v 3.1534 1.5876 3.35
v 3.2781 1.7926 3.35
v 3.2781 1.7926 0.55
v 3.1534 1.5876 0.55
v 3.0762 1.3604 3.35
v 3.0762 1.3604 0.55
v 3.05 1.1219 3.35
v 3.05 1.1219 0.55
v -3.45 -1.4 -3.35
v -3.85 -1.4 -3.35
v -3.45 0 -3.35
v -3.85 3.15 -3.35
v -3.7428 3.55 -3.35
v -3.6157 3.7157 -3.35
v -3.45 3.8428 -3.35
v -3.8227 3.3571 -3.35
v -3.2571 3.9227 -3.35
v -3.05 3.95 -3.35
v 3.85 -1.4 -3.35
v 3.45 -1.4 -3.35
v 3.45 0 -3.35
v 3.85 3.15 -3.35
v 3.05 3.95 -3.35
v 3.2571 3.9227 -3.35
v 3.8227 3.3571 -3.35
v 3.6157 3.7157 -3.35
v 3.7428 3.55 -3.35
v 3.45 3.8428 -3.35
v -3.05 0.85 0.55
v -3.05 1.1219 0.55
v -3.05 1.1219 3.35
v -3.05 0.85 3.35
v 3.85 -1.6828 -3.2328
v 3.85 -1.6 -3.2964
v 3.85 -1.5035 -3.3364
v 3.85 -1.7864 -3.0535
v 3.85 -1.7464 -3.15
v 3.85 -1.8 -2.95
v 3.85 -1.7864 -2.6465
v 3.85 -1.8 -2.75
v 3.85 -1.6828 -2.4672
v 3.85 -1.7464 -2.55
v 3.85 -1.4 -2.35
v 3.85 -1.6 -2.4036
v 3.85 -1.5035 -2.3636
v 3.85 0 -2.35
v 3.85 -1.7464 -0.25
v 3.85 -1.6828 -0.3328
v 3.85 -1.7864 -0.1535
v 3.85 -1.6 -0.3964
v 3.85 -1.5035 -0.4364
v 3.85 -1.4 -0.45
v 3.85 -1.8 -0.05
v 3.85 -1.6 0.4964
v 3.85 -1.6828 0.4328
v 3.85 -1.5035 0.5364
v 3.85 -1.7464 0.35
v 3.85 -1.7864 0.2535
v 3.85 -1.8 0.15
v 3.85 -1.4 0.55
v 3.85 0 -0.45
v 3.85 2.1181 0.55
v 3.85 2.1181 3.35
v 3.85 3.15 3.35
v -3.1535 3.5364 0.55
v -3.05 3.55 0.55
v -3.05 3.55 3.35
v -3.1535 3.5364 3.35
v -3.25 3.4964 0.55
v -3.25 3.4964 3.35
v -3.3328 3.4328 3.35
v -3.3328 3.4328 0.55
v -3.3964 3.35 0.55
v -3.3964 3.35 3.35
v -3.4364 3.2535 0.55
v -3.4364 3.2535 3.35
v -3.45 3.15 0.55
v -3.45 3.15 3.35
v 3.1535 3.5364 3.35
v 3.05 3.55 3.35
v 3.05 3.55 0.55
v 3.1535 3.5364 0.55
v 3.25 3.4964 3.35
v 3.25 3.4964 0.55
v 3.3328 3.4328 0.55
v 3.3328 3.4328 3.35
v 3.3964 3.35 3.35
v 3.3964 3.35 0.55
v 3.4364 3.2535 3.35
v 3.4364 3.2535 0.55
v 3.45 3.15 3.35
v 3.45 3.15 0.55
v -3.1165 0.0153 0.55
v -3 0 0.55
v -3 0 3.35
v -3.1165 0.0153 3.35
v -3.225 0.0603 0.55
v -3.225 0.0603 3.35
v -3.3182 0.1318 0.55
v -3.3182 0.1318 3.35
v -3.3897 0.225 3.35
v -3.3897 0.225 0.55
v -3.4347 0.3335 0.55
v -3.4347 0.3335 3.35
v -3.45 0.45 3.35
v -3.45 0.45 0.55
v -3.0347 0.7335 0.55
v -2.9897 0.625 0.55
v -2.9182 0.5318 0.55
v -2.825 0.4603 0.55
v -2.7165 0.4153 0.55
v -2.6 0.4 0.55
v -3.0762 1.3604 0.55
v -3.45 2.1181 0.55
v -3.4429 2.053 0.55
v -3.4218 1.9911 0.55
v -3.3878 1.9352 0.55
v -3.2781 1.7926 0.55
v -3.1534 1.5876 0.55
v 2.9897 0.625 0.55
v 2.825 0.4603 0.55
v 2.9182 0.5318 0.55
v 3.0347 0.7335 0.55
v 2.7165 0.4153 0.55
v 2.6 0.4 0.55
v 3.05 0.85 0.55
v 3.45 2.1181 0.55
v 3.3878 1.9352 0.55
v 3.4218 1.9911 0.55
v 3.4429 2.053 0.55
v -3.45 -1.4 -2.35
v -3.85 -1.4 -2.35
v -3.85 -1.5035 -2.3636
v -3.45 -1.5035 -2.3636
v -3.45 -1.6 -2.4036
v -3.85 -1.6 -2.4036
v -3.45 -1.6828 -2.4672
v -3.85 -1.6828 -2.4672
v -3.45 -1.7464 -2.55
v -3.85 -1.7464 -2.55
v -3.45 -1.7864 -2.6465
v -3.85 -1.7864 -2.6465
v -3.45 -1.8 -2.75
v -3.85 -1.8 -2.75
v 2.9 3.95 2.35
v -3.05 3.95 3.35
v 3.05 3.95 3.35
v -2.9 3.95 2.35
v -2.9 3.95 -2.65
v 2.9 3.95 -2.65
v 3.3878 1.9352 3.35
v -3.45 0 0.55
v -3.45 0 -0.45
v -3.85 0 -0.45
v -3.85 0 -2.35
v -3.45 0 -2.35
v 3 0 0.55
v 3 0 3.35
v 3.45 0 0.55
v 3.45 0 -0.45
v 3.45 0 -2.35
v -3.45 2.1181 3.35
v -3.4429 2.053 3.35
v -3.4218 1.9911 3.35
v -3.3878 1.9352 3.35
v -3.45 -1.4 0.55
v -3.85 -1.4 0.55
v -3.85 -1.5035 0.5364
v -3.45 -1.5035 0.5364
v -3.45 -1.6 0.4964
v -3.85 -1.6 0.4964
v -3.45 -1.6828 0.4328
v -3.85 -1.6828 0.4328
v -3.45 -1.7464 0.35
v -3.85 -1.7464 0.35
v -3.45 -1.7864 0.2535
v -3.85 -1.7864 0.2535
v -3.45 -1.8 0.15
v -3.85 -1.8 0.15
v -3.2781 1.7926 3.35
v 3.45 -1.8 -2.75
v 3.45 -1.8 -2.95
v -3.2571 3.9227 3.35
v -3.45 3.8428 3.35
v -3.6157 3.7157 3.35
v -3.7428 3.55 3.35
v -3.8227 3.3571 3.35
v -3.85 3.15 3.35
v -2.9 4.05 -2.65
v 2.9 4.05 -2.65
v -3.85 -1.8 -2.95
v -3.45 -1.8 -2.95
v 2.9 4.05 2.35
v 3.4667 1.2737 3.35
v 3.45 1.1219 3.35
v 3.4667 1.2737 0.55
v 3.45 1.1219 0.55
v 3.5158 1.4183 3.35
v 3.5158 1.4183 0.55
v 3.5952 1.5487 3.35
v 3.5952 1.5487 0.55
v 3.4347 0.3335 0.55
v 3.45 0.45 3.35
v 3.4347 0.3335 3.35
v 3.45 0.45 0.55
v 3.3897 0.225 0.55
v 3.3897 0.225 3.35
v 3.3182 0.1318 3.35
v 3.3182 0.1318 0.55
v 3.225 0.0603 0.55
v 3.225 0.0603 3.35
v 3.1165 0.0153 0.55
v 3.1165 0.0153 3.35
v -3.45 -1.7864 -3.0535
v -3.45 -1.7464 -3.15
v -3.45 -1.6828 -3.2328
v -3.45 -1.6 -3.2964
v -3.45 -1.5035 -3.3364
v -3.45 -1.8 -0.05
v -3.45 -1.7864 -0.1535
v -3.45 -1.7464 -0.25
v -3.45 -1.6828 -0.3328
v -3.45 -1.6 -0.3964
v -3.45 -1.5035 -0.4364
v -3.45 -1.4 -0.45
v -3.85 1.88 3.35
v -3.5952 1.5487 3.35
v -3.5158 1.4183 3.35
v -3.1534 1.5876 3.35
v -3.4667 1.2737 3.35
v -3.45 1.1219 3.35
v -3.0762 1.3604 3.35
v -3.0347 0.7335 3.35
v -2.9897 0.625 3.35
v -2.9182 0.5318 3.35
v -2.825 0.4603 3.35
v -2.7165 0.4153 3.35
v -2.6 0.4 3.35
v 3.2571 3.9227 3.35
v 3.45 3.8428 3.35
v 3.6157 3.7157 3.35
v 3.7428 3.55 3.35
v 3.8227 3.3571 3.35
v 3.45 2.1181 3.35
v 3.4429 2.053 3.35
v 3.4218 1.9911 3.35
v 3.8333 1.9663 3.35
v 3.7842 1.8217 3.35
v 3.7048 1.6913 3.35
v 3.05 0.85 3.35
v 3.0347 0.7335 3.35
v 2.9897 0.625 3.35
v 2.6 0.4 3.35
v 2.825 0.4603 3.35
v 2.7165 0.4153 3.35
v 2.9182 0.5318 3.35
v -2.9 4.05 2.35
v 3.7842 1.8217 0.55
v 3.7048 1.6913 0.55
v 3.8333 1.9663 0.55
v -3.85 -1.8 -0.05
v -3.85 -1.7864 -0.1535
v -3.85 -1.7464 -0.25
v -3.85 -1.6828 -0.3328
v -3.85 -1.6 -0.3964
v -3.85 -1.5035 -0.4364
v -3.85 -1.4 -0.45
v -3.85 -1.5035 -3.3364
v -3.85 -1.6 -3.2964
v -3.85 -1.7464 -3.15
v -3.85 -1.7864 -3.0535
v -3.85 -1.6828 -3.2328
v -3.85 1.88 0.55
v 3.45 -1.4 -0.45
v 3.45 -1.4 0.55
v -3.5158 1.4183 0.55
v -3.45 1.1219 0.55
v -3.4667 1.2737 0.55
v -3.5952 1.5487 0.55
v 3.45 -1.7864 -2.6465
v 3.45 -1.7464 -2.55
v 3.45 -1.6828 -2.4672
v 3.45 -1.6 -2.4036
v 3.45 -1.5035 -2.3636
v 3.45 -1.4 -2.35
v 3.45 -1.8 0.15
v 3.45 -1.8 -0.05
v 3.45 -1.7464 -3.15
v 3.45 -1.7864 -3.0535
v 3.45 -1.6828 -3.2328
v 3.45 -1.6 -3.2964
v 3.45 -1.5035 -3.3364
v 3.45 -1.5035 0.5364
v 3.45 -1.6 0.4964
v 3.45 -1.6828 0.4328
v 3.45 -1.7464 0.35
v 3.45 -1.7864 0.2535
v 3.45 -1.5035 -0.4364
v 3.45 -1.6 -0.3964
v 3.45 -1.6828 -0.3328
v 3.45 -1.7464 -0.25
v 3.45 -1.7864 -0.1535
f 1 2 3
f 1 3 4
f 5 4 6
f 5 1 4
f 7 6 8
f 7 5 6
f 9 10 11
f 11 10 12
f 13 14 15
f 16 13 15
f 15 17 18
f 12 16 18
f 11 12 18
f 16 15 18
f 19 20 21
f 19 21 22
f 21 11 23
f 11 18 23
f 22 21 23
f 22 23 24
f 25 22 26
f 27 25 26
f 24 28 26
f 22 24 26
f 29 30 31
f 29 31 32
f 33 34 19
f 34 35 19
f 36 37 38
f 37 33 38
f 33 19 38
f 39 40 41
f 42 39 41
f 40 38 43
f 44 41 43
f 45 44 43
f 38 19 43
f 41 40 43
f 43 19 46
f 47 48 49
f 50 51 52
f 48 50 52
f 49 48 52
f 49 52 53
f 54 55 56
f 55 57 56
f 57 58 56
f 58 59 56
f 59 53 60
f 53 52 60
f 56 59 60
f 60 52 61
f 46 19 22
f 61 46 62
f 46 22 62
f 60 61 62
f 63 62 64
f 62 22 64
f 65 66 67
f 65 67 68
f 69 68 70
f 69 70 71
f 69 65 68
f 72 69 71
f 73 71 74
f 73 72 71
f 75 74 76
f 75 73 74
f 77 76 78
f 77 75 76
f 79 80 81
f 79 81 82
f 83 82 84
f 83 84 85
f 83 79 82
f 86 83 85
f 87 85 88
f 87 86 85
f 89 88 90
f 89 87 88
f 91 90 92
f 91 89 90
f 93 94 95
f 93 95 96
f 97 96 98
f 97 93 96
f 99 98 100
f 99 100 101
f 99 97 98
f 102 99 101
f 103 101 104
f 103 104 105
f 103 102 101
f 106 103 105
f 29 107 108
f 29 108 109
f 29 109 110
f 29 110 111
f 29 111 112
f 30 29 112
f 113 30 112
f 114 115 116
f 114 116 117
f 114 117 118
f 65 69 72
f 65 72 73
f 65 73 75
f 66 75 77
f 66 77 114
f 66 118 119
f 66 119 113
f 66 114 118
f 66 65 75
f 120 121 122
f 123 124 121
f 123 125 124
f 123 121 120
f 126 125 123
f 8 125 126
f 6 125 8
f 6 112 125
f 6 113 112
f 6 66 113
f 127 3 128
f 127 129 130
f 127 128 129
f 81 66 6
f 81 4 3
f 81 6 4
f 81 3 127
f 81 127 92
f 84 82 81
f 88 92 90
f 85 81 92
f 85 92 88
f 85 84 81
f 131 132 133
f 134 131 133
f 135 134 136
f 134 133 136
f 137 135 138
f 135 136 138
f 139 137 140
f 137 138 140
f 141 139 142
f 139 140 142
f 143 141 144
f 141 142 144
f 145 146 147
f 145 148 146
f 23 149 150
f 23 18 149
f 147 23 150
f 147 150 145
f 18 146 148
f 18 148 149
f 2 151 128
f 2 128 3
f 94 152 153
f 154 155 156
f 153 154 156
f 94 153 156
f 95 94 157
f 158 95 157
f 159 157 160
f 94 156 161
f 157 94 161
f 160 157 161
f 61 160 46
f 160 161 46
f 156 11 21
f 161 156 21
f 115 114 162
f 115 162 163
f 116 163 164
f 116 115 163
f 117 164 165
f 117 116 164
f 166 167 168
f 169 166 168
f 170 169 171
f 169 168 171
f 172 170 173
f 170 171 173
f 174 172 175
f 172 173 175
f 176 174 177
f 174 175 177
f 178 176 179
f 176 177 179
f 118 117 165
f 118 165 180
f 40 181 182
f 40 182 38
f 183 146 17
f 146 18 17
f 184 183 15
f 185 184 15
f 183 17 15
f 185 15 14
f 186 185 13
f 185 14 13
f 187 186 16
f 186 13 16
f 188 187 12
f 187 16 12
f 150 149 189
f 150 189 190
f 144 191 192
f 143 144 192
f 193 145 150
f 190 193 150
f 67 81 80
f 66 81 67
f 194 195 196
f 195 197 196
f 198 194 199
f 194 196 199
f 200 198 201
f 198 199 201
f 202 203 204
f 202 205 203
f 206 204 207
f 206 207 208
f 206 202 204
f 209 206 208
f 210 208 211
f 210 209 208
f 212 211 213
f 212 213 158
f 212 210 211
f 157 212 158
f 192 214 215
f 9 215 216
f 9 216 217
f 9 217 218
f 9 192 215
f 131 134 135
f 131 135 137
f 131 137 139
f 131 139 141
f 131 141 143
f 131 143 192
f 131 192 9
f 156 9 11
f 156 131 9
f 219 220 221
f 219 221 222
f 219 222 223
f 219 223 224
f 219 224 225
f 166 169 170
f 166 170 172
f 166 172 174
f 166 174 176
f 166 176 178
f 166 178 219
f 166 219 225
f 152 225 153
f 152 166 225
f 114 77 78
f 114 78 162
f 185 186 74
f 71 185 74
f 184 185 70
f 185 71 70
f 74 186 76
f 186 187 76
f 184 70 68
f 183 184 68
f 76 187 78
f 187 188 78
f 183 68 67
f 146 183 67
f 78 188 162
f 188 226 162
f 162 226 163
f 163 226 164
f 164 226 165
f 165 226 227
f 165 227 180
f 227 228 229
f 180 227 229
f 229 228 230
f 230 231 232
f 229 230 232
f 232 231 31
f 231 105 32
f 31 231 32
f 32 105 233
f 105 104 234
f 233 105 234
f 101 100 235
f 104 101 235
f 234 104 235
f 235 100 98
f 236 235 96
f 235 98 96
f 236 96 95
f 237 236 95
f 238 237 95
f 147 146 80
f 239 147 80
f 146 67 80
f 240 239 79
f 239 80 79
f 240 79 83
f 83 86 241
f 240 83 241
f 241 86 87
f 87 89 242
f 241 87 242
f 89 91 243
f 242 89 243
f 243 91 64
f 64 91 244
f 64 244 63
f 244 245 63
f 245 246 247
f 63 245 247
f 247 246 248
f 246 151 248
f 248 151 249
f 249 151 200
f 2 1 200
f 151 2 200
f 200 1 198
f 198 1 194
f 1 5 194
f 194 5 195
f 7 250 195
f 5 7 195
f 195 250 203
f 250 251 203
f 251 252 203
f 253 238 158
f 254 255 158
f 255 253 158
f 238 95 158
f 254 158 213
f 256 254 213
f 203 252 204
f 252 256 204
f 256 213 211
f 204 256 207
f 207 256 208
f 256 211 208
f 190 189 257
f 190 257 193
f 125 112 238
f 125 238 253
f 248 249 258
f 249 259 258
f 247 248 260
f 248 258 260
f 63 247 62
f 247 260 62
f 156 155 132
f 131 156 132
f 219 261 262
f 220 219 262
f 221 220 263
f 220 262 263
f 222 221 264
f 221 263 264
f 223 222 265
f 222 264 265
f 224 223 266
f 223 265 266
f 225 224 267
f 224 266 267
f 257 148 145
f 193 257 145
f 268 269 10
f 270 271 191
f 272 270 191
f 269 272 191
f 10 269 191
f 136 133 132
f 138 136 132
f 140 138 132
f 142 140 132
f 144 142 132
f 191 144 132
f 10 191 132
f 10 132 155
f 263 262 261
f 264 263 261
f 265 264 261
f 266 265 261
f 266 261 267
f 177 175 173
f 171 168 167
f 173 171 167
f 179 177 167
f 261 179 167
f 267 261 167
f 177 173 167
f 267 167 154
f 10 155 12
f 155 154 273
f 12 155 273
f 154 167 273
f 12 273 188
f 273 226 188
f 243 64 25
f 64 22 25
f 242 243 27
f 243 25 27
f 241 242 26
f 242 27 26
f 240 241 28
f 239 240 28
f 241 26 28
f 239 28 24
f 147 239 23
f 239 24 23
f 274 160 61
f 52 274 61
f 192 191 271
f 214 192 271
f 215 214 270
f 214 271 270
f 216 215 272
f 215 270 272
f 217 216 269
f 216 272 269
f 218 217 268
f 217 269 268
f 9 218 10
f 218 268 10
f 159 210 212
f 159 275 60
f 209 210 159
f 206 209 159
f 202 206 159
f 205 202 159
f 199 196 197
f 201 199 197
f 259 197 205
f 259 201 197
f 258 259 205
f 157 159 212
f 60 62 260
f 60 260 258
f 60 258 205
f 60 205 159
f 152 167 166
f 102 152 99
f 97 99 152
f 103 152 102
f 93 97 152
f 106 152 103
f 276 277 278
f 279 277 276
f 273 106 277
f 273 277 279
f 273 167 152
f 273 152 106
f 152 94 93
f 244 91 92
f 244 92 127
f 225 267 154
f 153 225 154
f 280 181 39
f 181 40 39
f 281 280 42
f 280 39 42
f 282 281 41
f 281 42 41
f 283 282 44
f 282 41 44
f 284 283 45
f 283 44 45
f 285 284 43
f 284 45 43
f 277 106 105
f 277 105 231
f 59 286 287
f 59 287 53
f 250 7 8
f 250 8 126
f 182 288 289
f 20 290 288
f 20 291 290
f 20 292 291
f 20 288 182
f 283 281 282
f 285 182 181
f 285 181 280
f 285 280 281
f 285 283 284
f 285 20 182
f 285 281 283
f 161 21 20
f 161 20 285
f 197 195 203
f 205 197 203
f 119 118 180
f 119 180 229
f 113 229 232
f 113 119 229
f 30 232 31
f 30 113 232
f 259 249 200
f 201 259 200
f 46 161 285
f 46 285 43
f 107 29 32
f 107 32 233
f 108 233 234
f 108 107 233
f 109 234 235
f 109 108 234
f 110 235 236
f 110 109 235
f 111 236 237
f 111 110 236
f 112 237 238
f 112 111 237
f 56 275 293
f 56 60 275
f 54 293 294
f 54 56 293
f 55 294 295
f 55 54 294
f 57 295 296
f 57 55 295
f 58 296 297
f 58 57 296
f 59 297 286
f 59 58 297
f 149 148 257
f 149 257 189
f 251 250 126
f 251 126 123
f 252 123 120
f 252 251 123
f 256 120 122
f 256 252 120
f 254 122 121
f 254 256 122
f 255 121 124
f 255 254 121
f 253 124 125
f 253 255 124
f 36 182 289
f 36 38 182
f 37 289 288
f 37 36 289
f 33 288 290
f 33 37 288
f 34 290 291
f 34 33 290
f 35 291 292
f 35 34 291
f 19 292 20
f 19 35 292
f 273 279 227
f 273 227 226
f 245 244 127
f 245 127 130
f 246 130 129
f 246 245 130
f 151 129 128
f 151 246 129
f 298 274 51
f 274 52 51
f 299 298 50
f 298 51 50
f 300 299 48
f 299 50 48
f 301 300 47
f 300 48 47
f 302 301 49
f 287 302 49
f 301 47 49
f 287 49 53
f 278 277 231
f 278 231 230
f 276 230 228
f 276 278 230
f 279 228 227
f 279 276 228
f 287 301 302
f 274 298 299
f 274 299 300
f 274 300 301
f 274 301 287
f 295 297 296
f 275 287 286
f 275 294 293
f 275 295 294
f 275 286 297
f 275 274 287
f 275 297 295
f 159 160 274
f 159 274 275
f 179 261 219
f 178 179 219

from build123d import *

# Parameters (mm, degrees)
SKETCH1_W              = 7.7
SKETCH1_H              = 6.7
BOSS_EXTRUDE1_DEPTH    = 3.95
SKETCH2_W              = 0.4
SKETCH2_H              = 1
BOSS_EXTRUDE2_DEPTH    = 1.8
FILLET1_R              = 0.4
LPATTERN1_COUNT        = 2
LPATTERN1_PITCH        = 2.9
FILLET1_OF_LPATTERN1_R = 0.4
FILLET2_R              = 0.8
CUT_EXTRUDE1_DEPTH     = 2.8
FILLET3_R              = 0.45
FILLET4_R              = 0.7
CUT_EXTRUDE2_DEPTH     = 2.8
MIRROR3_START          = 0.55
MIRROR3_DEPTH          = 2.8
MIRROR3_START_2        = -2.95
MIRROR3_2_OUTLINE_W    = 0.4
MIRROR3_2_OUTLINE_H    = 1.8
MIRROR3_2_DEPTH        = 0.2
MIRROR3_START_3        = -0.05
MIRROR3_3_OUTLINE_W    = 0.4
MIRROR3_3_OUTLINE_H    = 1.8
MIRROR3_3_DEPTH        = 0.2
MIRROR3_START_4        = -3.85
MIRROR3_4_DEPTH        = 0.4
SKETCH5_W              = 5.8
SKETCH5_H              = 5
BOSS_EXTRUDE3_DEPTH    = 0.1


with BuildPart() as part:
    # Sketch1 → Boss-Extrude1 (new body)
    with BuildSketch(Plane(origin=(0, 0, 0), x_dir=(1, 0, 0), z_dir=(0, 1, 0))):
        Rectangle(SKETCH1_W, SKETCH1_H)
    extrude(amount=BOSS_EXTRUDE1_DEPTH)

    # Sketch2 → Boss-Extrude2 (add)
    with BuildSketch(Plane.XZ):
        with Locations((3.65, -2.85)):
            Rectangle(SKETCH2_W, SKETCH2_H)
    boss_extrude2 = extrude(amount=BOSS_EXTRUDE2_DEPTH)

    # Fillet1
    fillet1_edges = [part.edges().sort_by_distance(p)[0] for p in [
        (3.65, -1.8, -2.35),
        (3.65, -1.8, -3.35),
    ]]
    fillet(fillet1_edges, radius=FILLET1_R)

    # LPattern1: Boss-Extrude2 ×2
    with Locations(*[(0, 0, i * LPATTERN1_PITCH) for i in range(1, LPATTERN1_COUNT)]):
        add(boss_extrude2)

    # Fillet1 of LPattern1
    fillet1_of_lpattern1_edges = [part.edges().sort_by_distance(p)[0] for p in [
        (3.65, -1.8, 0.55),
        (3.65, -1.8, -0.45),
    ]]
    fillet(fillet1_of_lpattern1_edges, radius=FILLET1_OF_LPATTERN1_R)

    # Fillet2
    fillet2_edges = [part.edges().sort_by_distance(p)[0] for p in [
        (3.85, 3.95, 0),
        (-3.85, 3.95, 0),
    ]]
    fillet(fillet2_edges, radius=FILLET2_R)

    # Sketch3 → Cut-Extrude1 (cut)
    with BuildSketch(Plane.XY.offset(3.35)):
        Polygon((3.85, 1.36), (3.85, 1.88), (3.45, 1.36), (3.45, 0), (3.85, 0), align=None)
    extrude(amount=-CUT_EXTRUDE1_DEPTH, mode=Mode.SUBTRACT)

    # Fillet3
    fillet3_edges = [part.edges().sort_by_distance(p)[0] for p in [
        (3.45, 0, 1.95),
    ]]
    fillet(fillet3_edges, radius=FILLET3_R)

    # Fillet4
    fillet4_edges = [part.edges().sort_by_distance(p)[0] for p in [
        (3.45, 1.36, 1.95),
        (3.85, 1.88, 1.95),
    ]]
    fillet(fillet4_edges, radius=FILLET4_R)

    # Sketch4 → Cut-Extrude2 (cut)
    with BuildSketch(Plane.XY.offset(3.35)):
        with BuildLine():
            Line((0, 0.4), (0, 3.55))
            Line((0, 3.55), (3.05, 3.55))
            ThreePointArc((3.05, 3.55), (3.332842712, 3.432842712), (3.45, 3.15))
            Line((3.45, 3.15), (3.45, 2.118085363))
            ThreePointArc((3.45, 2.118085363), (3.434021266, 2.021483497), (3.387787197, 1.935172134))
            Line((3.387787197, 1.935172134), (3.278113612, 1.792596474))
            ThreePointArc((3.278113612, 1.792596474), (3.108588692, 1.476121479), (3.05, 1.121914637))
            Line((3.05, 1.121914637), (3.05, 0.85))
            ThreePointArc((3.05, 0.85), (2.918198052, 0.531801948), (2.6, 0.4))
            Line((2.6, 0.4), (0, 0.4))
        make_face()
    extrude(amount=-CUT_EXTRUDE2_DEPTH, mode=Mode.SUBTRACT)

    # Mirror3: read off the stored shape, not the designer's step
    # Mirror3 outline → Mirror3 (cut)
    with BuildSketch(Plane.XY.offset(MIRROR3_START)):
        with BuildLine():
            Line((-3.85, 1.88), (-3.85, 0))
            Line((-3.85, 0), (-3, 0))
            ThreePointArc((-3, 0), (-3.318198052, 0.131801948), (-3.45, 0.45))
            Line((-3.45, 0.45), (-3.45, 1.121914637))
            ThreePointArc((-3.45, 1.121914637), (-3.487283713, 1.347318991), (-3.595163208, 1.54871217))
            Line((-3.595163208, 1.54871217), (-3.85, 1.88))
        make_face()
        with BuildLine():
            ThreePointArc((-3.05, 0.85), (-2.918198052, 0.531801948), (-2.6, 0.4))
            Line((-2.6, 0.4), (0, 0.4))
            Line((0, 0.4), (0, 3.55))
            Line((0, 3.55), (-3.05, 3.55))
            ThreePointArc((-3.05, 3.55), (-3.332842712, 3.432842712), (-3.45, 3.15))
            Line((-3.45, 3.15), (-3.45, 2.118085363))
            ThreePointArc((-3.45, 2.118085363), (-3.434021266, 2.021483497), (-3.387787197, 1.935172134))
            Line((-3.387787197, 1.935172134), (-3.278113612, 1.792596474))
            ThreePointArc((-3.278113612, 1.792596474), (-3.108588692, 1.476121478), (-3.05, 1.121914637))
            Line((-3.05, 1.121914637), (-3.05, 0.85))
        make_face()
    extrude(amount=MIRROR3_DEPTH, mode=Mode.SUBTRACT)

    # Mirror3 2 outline → Mirror3 2 (add)
    with BuildSketch(Plane.XY.offset(MIRROR3_START_2)):
        with Locations((-3.65, -0.9)):
            Rectangle(MIRROR3_2_OUTLINE_W, MIRROR3_2_OUTLINE_H)
    extrude(amount=MIRROR3_2_DEPTH)

    # Mirror3 3 outline → Mirror3 3 (add)
    with BuildSketch(Plane.XY.offset(MIRROR3_START_3)):
        with Locations((-3.65, -0.9)):
            Rectangle(MIRROR3_3_OUTLINE_W, MIRROR3_3_OUTLINE_H)
    extrude(amount=MIRROR3_3_DEPTH)

    # Mirror3 4 outline → Mirror3 4 (add)
    with BuildSketch(Plane.YZ.offset(MIRROR3_START_4)):
        with BuildLine():
            Line((0, -2.75), (0, -2.35))
            Line((0, -2.35), (-1.4, -2.35))
            ThreePointArc((-1.4, -2.35), (-1.682842712, -2.467157288), (-1.8, -2.75))
            Line((-1.8, -2.75), (0, -2.75))
        make_face()
        with BuildLine():
            Line((-1.8, 0.15), (0, 0.15))
            Line((0, 0.15), (0, 0.55))
            Line((0, 0.55), (-1.4, 0.55))
            ThreePointArc((-1.4, 0.55), (-1.682842712, 0.432842712), (-1.8, 0.15))
        make_face()
        with BuildLine():
            Line((-1.4, -0.45), (0, -0.45))
            Line((0, -0.45), (0, -0.05))
            Line((0, -0.05), (-1.8, -0.05))
            ThreePointArc((-1.8, -0.05), (-1.682842712, -0.332842712), (-1.4, -0.45))
        make_face()
        with BuildLine():
            Line((0, -3.35), (0, -2.95))
            Line((0, -2.95), (-1.8, -2.95))
            ThreePointArc((-1.8, -2.95), (-1.682842712, -3.232842712), (-1.4, -3.35))
            Line((-1.4, -3.35), (0, -3.35))
        make_face()
    extrude(amount=MIRROR3_4_DEPTH)

    # Sketch5 → Boss-Extrude3 (add)
    with BuildSketch(Plane(origin=(0, 3.95, 0), x_dir=(1, 0, 0), z_dir=(0, 1, 0))):
        with Locations((0, 0.15)):
            Rectangle(SKETCH5_W, SKETCH5_H)
    extrude(amount=BOSS_EXTRUDE3_DEPTH)


solid = part.part
